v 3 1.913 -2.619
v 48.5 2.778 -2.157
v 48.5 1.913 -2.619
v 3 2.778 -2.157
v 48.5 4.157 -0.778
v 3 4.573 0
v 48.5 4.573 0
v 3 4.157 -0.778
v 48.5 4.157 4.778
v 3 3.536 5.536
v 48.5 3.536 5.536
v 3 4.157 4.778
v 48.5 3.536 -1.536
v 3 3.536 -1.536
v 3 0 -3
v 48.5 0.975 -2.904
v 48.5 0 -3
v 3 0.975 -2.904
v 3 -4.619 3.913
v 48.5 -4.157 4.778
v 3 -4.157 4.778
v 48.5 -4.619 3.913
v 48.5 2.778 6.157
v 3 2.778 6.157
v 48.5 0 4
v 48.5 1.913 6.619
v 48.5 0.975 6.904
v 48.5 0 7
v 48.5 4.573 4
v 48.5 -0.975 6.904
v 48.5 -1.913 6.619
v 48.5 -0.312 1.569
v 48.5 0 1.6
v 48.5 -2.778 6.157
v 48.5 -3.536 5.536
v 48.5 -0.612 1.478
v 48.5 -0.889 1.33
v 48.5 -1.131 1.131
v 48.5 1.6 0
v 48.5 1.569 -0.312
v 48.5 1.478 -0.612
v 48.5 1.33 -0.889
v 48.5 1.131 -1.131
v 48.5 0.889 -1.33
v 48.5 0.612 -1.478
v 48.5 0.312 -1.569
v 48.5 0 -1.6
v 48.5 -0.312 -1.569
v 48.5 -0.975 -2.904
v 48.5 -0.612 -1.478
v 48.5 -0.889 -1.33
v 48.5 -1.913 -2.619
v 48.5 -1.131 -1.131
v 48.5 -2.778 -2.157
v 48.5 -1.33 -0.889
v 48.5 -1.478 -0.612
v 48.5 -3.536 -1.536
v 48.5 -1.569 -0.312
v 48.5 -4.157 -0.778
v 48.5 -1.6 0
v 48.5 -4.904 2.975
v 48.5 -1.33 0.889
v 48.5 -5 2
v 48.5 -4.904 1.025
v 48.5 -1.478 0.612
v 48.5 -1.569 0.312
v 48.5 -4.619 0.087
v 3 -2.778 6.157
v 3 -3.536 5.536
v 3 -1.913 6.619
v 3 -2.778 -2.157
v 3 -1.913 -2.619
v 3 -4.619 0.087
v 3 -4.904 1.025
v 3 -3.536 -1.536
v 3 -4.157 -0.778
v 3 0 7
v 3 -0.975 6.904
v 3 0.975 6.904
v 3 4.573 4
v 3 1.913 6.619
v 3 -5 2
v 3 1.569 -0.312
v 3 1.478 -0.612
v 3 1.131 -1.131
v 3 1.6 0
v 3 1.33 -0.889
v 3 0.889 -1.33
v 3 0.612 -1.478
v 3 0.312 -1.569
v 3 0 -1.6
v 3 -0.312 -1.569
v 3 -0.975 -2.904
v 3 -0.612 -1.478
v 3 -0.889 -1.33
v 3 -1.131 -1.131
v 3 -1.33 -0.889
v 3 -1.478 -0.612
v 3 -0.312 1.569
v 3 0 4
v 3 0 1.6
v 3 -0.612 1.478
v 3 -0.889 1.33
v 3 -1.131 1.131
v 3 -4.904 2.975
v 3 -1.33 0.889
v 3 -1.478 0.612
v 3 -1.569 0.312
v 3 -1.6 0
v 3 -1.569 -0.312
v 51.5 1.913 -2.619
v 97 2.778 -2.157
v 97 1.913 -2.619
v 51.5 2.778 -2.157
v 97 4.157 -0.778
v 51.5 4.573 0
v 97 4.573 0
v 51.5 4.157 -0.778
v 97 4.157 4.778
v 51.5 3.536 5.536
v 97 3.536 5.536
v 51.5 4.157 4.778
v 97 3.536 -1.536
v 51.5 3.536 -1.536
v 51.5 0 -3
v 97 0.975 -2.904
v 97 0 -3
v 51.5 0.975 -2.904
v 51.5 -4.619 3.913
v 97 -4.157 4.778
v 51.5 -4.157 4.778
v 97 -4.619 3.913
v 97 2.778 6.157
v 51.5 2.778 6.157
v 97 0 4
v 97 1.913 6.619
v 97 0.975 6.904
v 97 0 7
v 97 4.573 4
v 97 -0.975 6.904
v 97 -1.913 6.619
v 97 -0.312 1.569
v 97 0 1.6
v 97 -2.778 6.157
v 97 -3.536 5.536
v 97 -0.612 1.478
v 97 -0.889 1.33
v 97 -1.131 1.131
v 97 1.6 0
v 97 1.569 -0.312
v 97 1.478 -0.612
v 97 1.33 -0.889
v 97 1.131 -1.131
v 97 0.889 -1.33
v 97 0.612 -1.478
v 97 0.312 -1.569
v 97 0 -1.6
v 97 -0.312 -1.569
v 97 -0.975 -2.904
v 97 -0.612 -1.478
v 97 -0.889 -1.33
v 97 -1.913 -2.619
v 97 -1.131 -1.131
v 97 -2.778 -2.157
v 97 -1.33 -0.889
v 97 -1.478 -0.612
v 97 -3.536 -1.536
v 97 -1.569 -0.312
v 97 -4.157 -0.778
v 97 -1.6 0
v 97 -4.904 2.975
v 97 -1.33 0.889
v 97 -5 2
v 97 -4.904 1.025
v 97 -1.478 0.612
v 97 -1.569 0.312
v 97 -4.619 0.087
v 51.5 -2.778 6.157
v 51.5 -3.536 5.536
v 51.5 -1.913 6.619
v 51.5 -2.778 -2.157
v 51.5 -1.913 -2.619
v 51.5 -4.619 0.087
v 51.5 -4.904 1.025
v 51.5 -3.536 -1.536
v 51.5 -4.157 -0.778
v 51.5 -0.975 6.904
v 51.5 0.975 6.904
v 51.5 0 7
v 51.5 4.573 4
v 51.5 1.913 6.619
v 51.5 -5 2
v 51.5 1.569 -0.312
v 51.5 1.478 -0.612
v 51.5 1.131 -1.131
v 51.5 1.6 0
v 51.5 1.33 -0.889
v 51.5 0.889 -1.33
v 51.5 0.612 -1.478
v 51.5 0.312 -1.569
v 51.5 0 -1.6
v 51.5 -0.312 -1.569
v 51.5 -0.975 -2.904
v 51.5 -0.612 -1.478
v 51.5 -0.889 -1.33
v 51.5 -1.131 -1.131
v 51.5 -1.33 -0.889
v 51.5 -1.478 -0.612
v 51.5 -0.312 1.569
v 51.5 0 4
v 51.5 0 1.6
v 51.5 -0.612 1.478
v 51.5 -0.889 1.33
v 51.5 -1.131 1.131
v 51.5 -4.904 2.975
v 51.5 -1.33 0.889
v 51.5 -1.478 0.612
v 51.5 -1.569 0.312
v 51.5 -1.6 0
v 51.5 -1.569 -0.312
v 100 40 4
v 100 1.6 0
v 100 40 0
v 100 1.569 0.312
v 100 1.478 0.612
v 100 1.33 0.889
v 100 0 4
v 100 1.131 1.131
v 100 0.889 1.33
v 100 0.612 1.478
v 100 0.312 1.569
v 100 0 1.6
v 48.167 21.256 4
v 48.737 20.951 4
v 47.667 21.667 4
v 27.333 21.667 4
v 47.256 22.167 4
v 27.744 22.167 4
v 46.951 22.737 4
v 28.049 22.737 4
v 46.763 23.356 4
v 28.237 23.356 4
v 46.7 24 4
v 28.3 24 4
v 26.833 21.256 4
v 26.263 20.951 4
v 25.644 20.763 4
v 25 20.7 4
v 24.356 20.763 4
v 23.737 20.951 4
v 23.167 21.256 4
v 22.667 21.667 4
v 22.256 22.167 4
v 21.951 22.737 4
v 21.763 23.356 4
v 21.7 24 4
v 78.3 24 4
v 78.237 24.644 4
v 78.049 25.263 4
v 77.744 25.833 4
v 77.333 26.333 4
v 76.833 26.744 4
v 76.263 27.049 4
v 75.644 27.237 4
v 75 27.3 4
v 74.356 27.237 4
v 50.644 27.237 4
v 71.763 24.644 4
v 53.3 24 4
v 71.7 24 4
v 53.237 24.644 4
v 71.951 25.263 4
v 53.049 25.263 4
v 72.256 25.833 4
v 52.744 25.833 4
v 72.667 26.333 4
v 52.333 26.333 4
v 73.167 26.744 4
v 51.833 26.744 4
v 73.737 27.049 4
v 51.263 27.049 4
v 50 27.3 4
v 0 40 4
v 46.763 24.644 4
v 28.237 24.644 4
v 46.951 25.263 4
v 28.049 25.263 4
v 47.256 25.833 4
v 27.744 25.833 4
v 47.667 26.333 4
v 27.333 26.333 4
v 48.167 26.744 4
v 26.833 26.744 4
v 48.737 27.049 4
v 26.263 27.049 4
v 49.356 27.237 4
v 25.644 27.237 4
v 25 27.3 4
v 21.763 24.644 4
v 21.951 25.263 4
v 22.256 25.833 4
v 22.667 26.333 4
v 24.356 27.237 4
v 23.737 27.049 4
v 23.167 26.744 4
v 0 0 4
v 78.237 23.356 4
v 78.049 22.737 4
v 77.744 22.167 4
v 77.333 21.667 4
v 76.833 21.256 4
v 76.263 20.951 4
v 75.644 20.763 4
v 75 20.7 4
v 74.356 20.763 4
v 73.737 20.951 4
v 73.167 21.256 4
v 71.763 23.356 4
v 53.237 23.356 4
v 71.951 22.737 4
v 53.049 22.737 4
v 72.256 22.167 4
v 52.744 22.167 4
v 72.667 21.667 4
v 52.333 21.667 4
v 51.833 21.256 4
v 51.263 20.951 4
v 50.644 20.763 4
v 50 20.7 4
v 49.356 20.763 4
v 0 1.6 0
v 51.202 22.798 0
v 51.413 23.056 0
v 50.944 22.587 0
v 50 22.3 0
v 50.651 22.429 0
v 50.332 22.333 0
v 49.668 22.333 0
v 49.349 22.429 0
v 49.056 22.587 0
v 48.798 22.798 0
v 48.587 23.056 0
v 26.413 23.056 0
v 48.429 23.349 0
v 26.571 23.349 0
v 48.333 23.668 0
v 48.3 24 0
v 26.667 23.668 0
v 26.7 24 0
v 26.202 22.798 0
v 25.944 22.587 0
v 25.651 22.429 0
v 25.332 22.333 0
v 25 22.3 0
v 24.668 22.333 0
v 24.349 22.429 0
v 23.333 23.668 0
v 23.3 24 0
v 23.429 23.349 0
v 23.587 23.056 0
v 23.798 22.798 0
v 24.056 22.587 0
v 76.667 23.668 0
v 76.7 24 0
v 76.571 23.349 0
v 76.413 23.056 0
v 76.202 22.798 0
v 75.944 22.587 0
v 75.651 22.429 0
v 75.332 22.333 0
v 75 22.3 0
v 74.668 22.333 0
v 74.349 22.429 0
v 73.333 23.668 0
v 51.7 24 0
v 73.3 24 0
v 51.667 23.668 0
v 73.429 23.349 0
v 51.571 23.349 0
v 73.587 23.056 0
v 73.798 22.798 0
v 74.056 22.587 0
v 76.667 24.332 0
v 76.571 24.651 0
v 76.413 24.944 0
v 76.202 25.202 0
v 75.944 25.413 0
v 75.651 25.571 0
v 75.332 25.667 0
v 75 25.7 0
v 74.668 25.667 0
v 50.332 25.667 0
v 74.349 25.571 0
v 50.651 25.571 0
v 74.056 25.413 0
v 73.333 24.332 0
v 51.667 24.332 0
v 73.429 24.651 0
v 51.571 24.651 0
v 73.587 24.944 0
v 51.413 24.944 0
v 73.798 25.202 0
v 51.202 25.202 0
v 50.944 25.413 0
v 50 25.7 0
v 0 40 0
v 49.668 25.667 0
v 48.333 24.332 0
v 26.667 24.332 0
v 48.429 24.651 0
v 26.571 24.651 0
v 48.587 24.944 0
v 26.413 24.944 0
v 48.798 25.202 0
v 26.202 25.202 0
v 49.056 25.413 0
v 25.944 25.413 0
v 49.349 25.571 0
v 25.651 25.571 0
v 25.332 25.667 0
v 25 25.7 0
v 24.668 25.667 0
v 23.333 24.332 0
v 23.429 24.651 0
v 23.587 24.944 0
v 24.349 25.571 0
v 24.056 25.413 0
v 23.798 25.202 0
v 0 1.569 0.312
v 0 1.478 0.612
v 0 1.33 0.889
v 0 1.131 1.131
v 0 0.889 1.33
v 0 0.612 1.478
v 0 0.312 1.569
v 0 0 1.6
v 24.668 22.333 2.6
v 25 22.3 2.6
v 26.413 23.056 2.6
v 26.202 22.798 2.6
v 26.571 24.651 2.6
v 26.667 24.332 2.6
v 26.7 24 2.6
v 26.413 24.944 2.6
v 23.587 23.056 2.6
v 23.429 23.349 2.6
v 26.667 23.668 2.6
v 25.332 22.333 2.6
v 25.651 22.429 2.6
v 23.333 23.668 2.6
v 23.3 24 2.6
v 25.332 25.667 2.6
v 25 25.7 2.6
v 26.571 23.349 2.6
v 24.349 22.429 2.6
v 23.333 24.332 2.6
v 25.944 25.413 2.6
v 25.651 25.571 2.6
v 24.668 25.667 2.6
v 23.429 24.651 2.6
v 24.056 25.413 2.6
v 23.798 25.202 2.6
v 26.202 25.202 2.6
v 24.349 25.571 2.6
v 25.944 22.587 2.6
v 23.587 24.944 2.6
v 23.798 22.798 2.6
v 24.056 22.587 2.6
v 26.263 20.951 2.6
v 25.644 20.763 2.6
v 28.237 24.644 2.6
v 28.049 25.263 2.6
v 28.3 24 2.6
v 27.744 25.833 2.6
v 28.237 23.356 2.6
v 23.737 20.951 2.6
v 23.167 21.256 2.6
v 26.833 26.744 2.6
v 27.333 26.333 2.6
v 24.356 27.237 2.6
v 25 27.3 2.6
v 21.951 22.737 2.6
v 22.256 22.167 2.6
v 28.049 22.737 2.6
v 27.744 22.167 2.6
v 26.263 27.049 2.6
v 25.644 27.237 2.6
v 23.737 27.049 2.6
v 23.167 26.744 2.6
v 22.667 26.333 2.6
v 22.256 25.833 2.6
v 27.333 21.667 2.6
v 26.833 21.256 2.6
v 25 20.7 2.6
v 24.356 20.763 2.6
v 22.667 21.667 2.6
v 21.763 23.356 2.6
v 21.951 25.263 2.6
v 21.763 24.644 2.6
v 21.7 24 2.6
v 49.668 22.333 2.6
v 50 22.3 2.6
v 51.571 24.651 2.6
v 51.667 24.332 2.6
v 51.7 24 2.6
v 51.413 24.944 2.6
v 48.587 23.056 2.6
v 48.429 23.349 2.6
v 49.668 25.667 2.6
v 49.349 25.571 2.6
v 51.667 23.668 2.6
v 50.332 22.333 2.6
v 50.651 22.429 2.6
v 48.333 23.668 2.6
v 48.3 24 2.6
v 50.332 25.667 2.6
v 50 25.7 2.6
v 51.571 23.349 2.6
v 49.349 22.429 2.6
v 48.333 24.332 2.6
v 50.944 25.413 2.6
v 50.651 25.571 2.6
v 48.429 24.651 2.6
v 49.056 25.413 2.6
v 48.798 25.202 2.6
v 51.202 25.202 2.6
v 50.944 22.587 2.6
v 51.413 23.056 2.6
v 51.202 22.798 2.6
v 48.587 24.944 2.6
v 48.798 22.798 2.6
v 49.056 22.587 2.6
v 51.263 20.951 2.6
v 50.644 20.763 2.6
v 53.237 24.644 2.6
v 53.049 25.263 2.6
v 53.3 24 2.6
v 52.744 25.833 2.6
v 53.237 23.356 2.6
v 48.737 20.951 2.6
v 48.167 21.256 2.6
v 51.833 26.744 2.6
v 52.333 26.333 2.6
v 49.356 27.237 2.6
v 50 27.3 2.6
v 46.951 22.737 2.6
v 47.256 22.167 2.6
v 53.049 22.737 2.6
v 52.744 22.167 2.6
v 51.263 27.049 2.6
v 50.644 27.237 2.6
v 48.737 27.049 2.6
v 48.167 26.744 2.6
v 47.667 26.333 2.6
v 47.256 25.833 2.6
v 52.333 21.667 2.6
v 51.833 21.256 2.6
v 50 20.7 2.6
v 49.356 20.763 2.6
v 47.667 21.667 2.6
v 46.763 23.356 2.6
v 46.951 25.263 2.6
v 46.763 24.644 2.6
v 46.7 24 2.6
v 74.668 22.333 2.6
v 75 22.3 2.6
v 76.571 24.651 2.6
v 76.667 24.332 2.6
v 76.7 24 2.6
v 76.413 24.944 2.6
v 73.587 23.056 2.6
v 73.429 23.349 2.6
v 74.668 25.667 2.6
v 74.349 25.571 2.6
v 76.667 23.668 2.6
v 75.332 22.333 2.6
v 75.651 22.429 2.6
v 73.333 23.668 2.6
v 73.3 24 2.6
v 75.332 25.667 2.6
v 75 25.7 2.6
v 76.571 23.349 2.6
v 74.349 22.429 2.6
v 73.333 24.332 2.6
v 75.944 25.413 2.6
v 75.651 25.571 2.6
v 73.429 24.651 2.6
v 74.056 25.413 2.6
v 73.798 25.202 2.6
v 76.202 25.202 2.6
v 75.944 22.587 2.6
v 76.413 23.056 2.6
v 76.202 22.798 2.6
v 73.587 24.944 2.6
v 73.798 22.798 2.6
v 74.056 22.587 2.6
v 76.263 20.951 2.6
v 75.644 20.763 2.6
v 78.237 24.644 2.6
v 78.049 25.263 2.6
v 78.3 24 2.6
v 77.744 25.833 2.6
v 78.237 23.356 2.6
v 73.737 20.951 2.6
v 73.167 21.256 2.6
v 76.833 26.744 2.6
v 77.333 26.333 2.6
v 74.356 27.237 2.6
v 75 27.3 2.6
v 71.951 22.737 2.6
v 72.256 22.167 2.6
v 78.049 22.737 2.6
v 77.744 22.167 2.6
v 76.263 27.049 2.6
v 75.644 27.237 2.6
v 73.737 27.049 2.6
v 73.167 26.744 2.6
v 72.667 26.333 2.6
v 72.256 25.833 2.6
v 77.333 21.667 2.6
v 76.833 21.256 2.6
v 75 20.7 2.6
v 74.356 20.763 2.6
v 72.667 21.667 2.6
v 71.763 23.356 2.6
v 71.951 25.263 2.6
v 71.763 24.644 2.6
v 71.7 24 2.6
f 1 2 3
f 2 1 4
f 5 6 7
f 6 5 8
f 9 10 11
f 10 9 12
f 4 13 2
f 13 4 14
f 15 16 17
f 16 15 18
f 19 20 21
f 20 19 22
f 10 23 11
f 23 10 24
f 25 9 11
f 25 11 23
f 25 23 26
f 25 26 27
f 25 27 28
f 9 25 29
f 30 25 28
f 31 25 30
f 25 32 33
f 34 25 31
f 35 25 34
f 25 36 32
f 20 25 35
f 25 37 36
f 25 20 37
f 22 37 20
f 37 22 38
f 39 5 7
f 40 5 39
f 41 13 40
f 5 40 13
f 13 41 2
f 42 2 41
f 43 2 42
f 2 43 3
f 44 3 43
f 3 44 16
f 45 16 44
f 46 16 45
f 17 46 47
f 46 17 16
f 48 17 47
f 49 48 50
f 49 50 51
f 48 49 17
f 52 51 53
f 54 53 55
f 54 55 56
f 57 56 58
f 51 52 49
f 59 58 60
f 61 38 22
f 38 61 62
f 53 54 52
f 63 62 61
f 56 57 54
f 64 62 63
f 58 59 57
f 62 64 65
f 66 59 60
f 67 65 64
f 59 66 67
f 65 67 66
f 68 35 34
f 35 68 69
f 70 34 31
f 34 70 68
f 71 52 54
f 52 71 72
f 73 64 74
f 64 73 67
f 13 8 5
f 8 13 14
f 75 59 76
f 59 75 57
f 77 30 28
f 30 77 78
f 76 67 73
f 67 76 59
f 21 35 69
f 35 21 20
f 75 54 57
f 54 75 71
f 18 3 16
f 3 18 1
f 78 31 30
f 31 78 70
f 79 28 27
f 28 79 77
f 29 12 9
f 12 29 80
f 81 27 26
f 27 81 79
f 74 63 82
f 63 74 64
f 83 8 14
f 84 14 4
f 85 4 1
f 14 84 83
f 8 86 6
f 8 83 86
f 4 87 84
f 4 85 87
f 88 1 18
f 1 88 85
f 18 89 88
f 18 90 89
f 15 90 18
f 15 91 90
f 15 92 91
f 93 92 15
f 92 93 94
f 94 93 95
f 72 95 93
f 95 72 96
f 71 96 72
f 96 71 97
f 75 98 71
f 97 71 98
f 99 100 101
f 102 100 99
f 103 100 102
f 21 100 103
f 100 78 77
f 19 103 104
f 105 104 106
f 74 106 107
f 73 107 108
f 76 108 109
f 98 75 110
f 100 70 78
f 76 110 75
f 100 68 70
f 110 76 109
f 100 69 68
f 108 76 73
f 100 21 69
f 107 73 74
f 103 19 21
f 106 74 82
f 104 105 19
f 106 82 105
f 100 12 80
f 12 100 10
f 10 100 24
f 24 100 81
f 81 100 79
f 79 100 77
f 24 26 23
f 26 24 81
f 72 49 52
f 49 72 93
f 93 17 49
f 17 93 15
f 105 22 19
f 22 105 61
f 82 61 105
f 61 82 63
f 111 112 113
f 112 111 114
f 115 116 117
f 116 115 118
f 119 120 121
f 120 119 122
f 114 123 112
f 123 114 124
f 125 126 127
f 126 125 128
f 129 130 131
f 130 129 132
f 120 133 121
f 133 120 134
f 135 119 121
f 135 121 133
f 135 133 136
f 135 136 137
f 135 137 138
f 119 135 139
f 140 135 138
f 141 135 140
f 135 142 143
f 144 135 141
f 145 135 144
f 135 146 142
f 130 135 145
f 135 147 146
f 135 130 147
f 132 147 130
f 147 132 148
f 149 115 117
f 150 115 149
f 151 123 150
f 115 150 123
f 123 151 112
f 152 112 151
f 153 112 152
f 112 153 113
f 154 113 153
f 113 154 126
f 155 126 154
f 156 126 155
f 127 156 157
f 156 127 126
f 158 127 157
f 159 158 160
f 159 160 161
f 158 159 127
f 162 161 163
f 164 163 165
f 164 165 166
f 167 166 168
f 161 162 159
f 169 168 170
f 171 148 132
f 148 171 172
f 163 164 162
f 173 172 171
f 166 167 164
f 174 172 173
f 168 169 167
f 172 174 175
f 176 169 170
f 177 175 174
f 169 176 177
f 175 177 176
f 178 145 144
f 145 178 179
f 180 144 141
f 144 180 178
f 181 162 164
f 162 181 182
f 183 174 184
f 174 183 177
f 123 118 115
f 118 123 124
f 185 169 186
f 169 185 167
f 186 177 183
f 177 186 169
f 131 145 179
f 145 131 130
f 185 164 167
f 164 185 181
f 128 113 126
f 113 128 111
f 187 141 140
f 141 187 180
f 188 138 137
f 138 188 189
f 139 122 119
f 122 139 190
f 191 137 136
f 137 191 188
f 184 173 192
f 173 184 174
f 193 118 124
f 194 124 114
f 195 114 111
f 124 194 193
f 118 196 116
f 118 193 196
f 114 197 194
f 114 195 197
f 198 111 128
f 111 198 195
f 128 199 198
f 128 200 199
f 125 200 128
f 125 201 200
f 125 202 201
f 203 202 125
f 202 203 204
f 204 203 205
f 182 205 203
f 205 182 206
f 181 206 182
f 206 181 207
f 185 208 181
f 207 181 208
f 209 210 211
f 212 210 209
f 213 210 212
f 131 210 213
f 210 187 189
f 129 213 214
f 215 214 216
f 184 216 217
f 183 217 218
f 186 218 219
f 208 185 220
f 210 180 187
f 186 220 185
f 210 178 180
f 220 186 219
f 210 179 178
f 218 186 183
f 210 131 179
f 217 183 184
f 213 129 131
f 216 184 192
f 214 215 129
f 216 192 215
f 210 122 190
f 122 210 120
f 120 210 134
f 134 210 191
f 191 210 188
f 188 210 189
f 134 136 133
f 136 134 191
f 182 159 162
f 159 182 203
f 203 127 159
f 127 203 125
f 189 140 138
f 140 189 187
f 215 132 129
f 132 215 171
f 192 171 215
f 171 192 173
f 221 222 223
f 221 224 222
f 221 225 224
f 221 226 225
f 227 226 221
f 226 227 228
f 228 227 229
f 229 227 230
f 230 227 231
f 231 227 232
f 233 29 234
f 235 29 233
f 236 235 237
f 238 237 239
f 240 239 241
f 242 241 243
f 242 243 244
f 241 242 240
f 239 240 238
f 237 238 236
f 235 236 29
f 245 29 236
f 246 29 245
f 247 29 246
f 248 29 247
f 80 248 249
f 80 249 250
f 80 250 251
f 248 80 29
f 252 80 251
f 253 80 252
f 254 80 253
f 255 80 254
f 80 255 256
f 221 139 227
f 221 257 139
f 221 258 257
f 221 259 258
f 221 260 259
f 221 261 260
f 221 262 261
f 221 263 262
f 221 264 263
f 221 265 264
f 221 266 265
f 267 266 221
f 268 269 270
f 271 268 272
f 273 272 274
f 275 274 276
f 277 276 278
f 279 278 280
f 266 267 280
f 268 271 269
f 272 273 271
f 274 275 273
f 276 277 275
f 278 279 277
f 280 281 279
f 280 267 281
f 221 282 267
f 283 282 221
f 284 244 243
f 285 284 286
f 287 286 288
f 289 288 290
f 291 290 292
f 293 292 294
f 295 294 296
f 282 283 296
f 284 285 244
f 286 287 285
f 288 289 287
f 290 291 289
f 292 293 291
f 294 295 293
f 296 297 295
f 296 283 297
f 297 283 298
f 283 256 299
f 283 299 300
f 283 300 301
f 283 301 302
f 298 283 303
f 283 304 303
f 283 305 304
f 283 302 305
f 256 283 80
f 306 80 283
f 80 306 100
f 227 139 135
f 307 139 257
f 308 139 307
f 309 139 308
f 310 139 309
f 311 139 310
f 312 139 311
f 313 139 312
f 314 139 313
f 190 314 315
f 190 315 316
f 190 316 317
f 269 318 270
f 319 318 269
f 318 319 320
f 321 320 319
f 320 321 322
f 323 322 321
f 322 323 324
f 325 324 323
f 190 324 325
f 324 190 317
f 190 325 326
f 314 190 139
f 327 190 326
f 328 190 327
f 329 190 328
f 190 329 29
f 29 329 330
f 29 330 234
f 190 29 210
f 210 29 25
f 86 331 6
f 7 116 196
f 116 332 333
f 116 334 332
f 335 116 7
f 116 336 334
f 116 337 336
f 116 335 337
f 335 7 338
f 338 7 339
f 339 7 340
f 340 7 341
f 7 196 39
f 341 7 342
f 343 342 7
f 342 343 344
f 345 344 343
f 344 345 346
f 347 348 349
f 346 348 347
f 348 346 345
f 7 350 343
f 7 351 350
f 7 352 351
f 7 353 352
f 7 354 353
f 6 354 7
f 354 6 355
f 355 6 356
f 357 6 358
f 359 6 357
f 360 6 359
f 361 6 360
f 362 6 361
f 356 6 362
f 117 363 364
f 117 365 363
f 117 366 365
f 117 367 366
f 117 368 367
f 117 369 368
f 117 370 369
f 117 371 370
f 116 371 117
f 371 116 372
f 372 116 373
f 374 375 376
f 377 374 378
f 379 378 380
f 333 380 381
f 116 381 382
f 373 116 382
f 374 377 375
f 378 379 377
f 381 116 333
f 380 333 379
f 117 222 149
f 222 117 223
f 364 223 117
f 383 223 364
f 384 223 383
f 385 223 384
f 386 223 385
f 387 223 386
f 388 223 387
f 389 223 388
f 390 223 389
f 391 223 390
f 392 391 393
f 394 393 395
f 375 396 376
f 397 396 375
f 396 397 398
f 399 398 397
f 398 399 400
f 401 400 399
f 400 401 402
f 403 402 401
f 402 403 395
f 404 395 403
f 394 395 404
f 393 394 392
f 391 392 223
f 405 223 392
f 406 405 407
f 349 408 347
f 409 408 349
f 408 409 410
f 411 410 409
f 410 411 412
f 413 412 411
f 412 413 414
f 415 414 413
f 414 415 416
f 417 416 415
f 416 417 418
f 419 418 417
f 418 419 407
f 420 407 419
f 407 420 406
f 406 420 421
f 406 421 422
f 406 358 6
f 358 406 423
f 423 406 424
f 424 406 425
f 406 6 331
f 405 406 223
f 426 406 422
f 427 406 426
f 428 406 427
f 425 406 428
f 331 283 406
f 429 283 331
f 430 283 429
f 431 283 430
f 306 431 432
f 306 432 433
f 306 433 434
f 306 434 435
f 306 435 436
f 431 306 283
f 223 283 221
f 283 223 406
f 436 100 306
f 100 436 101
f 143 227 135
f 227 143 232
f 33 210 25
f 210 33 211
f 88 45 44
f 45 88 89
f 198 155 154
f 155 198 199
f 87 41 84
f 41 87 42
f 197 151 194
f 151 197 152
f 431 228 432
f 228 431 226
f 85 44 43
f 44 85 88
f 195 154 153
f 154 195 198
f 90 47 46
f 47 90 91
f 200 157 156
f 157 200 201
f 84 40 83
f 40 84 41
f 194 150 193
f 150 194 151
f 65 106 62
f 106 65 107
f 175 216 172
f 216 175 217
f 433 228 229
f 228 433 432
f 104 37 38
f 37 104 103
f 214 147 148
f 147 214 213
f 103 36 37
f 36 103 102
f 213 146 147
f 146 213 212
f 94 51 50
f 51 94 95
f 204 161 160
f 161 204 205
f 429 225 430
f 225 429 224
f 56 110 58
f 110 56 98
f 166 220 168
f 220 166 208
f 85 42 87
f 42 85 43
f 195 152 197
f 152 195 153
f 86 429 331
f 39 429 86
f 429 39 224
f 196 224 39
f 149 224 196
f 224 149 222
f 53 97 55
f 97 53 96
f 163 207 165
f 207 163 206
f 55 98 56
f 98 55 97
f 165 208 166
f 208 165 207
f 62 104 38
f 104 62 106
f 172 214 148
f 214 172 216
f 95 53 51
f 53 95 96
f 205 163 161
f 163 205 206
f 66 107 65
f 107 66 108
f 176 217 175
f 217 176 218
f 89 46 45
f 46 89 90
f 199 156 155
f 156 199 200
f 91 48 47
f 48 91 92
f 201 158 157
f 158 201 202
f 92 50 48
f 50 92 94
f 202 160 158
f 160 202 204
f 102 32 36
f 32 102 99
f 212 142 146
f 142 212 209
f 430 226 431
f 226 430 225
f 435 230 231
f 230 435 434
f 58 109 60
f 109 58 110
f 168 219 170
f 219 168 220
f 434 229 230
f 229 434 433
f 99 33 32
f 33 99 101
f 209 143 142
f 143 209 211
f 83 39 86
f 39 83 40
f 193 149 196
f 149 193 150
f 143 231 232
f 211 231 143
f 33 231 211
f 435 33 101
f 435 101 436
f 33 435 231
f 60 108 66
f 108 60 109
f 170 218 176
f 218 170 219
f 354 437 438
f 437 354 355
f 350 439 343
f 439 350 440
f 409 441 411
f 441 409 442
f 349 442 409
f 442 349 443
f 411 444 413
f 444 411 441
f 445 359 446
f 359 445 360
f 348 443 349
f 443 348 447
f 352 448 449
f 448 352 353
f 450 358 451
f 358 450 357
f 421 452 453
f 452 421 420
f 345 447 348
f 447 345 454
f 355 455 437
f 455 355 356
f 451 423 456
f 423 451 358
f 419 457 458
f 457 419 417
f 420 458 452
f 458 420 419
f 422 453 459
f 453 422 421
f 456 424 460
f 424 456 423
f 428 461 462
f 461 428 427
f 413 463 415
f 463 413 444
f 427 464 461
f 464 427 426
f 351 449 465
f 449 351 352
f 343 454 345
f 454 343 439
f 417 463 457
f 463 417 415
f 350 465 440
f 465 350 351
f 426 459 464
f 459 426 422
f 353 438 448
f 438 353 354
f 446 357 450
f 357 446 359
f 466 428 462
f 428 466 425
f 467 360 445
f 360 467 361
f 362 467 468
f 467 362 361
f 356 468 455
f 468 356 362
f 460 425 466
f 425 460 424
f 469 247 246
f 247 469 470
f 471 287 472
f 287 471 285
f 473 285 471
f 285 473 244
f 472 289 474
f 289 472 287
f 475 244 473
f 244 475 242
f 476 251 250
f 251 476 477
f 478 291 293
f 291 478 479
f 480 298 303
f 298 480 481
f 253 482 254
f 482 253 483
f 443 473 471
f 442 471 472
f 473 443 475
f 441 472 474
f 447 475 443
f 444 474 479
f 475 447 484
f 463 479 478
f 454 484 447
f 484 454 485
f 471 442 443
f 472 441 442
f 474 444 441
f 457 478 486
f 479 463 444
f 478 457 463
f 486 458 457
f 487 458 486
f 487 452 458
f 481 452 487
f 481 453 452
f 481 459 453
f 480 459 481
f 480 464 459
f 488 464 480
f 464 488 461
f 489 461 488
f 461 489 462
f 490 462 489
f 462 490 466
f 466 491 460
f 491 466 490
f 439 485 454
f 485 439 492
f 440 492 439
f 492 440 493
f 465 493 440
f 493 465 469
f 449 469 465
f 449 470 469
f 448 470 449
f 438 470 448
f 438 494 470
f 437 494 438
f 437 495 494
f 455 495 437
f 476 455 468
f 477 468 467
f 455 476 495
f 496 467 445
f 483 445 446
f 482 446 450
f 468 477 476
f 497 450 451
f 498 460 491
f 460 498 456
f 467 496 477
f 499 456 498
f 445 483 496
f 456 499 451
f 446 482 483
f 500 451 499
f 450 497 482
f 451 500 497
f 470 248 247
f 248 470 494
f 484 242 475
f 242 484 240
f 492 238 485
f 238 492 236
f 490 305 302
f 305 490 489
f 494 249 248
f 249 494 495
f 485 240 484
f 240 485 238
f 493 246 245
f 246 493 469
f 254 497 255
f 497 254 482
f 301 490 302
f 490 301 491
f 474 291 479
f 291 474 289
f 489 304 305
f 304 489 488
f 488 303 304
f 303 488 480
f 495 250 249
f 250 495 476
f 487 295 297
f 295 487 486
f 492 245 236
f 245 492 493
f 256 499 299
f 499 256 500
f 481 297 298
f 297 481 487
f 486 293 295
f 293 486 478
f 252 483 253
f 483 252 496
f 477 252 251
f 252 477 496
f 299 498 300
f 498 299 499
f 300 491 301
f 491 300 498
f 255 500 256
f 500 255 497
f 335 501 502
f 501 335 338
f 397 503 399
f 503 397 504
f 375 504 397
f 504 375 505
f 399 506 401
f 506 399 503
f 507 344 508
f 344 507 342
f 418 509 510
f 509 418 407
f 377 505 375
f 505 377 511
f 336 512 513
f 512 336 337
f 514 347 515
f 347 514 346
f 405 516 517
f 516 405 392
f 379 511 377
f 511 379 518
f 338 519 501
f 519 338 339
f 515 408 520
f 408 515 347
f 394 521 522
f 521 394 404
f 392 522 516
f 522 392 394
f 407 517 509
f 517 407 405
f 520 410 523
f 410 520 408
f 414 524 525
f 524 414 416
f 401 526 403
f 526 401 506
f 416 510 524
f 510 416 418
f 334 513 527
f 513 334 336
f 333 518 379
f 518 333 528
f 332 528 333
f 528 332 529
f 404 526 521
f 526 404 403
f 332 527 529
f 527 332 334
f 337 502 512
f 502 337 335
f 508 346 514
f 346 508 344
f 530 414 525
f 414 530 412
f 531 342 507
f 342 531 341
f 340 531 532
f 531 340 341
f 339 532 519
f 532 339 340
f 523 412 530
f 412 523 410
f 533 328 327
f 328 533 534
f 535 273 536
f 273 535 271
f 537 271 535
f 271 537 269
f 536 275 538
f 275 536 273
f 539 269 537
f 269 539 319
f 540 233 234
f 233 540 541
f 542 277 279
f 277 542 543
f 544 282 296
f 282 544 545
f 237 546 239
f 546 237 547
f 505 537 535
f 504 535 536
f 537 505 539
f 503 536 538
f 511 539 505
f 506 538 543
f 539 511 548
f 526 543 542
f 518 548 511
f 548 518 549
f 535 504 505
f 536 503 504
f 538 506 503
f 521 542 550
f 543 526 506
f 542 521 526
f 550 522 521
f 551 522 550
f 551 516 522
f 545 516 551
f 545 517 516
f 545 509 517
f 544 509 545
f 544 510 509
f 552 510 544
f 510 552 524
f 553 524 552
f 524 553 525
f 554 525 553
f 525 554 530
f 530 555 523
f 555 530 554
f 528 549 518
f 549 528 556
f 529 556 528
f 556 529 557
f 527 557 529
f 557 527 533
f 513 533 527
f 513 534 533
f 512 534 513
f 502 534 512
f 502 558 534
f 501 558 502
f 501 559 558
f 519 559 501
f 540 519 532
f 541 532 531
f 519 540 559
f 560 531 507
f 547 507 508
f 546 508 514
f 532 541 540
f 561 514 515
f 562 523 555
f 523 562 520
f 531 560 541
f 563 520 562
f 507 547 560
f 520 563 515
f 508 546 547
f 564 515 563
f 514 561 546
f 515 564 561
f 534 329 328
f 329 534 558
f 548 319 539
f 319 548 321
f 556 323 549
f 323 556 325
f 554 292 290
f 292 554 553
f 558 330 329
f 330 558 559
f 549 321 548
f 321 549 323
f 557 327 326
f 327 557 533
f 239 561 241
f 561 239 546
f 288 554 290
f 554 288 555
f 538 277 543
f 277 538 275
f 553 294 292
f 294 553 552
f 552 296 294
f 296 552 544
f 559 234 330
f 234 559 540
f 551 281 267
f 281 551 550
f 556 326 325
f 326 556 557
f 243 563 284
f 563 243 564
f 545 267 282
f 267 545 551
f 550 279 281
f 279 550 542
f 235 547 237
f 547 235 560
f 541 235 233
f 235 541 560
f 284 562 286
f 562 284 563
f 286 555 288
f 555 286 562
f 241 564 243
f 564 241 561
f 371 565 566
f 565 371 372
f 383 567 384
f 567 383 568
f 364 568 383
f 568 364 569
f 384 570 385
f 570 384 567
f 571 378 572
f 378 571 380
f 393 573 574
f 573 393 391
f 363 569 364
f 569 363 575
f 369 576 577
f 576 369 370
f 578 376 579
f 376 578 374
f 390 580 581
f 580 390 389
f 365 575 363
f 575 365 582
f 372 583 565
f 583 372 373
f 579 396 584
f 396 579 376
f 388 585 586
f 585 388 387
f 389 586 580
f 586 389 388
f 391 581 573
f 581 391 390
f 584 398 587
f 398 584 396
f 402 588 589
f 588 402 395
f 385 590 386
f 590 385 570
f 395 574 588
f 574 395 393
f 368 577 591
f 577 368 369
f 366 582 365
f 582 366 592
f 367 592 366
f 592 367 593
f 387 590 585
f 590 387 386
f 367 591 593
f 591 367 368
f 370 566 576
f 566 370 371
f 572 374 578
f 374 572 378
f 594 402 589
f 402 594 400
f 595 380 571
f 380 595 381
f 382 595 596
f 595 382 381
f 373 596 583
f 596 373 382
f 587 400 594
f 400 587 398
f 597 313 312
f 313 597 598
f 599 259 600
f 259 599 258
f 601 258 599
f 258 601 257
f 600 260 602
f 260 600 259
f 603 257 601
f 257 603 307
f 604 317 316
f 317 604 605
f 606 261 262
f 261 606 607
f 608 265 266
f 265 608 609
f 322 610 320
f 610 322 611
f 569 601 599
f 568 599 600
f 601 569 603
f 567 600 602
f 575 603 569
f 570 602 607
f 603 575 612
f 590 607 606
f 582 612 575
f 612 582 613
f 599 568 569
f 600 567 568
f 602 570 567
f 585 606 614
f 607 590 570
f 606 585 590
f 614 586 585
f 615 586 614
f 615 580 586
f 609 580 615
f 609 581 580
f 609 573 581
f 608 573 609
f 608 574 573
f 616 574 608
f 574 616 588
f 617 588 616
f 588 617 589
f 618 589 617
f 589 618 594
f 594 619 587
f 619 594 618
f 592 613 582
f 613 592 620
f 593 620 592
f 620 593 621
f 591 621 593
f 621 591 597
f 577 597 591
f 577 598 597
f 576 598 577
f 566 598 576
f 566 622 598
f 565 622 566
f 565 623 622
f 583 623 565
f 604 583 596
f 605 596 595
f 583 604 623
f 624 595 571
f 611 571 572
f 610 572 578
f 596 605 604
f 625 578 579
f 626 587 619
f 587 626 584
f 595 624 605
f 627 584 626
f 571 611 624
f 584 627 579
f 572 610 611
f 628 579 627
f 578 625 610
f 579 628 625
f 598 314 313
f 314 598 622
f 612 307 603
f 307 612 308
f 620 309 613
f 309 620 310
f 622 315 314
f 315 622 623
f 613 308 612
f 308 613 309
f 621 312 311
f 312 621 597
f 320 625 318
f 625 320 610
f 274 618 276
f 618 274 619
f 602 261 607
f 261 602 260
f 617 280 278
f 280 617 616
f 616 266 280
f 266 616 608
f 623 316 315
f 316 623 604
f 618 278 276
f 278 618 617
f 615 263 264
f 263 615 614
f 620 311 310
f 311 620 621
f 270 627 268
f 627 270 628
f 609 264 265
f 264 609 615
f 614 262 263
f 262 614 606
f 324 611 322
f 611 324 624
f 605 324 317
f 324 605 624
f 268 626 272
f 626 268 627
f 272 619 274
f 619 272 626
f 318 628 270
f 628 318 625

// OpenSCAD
$fn = 32;

// ----------------------------------------------------------------------
// Hinge leaf: 100 x 45 x 10 mm
// ----------------------------------------------------------------------

// --- parameters (mm) ---
plate_len = 100;          // leaf length, X
plate_w = 40;             // leaf width, Y
plate_t = 4;              // leaf thickness
barrel_d = 10;            // knuckle diameter
barrel_w = 45.5;          // knuckle width
knuckle_n = 2;            // number of knuckles
pin_d = 3.2;              // pin bore
gap = 3;                  // gap between the knuckles
screw_d = 3.4;            // screw clearance
cs_d = 6.6;               // countersink diameter
cs_h = 1.4;               // countersink depth

module leaf() {
  cube([plate_len, plate_w, plate_t]);
}

module knuckles() {
  /* barrels sit on the leaf edge, the pin axis at half the leaf thickness */
  for (i = [0 : knuckle_n - 1])
    translate([gap + i * (barrel_w + gap), 0, plate_t * 0.5])
      rotate([0, 90, 0]) cylinder(h = barrel_w, d = barrel_d);
}

difference() {
  union() {
    leaf();
    knuckles();
  }
  rotate([0, 90, 0]) translate([0, 0, -1])
    cylinder(h = plate_len + 2, d = pin_d);
  translate([25, plate_w * 0.6, -1]) cylinder(h = plate_t + 2, d = screw_d);
  translate([25, plate_w * 0.6, plate_t - cs_h]) cylinder(h = cs_h + 0.5, d = cs_d);
  translate([50, plate_w * 0.6, -1]) cylinder(h = plate_t + 2, d = screw_d);
  translate([50, plate_w * 0.6, plate_t - cs_h]) cylinder(h = cs_h + 0.5, d = cs_d);
  translate([75, plate_w * 0.6, -1]) cylinder(h = plate_t + 2, d = screw_d);
  translate([75, plate_w * 0.6, plate_t - cs_h]) cylinder(h = cs_h + 0.5, d = cs_d);
}
